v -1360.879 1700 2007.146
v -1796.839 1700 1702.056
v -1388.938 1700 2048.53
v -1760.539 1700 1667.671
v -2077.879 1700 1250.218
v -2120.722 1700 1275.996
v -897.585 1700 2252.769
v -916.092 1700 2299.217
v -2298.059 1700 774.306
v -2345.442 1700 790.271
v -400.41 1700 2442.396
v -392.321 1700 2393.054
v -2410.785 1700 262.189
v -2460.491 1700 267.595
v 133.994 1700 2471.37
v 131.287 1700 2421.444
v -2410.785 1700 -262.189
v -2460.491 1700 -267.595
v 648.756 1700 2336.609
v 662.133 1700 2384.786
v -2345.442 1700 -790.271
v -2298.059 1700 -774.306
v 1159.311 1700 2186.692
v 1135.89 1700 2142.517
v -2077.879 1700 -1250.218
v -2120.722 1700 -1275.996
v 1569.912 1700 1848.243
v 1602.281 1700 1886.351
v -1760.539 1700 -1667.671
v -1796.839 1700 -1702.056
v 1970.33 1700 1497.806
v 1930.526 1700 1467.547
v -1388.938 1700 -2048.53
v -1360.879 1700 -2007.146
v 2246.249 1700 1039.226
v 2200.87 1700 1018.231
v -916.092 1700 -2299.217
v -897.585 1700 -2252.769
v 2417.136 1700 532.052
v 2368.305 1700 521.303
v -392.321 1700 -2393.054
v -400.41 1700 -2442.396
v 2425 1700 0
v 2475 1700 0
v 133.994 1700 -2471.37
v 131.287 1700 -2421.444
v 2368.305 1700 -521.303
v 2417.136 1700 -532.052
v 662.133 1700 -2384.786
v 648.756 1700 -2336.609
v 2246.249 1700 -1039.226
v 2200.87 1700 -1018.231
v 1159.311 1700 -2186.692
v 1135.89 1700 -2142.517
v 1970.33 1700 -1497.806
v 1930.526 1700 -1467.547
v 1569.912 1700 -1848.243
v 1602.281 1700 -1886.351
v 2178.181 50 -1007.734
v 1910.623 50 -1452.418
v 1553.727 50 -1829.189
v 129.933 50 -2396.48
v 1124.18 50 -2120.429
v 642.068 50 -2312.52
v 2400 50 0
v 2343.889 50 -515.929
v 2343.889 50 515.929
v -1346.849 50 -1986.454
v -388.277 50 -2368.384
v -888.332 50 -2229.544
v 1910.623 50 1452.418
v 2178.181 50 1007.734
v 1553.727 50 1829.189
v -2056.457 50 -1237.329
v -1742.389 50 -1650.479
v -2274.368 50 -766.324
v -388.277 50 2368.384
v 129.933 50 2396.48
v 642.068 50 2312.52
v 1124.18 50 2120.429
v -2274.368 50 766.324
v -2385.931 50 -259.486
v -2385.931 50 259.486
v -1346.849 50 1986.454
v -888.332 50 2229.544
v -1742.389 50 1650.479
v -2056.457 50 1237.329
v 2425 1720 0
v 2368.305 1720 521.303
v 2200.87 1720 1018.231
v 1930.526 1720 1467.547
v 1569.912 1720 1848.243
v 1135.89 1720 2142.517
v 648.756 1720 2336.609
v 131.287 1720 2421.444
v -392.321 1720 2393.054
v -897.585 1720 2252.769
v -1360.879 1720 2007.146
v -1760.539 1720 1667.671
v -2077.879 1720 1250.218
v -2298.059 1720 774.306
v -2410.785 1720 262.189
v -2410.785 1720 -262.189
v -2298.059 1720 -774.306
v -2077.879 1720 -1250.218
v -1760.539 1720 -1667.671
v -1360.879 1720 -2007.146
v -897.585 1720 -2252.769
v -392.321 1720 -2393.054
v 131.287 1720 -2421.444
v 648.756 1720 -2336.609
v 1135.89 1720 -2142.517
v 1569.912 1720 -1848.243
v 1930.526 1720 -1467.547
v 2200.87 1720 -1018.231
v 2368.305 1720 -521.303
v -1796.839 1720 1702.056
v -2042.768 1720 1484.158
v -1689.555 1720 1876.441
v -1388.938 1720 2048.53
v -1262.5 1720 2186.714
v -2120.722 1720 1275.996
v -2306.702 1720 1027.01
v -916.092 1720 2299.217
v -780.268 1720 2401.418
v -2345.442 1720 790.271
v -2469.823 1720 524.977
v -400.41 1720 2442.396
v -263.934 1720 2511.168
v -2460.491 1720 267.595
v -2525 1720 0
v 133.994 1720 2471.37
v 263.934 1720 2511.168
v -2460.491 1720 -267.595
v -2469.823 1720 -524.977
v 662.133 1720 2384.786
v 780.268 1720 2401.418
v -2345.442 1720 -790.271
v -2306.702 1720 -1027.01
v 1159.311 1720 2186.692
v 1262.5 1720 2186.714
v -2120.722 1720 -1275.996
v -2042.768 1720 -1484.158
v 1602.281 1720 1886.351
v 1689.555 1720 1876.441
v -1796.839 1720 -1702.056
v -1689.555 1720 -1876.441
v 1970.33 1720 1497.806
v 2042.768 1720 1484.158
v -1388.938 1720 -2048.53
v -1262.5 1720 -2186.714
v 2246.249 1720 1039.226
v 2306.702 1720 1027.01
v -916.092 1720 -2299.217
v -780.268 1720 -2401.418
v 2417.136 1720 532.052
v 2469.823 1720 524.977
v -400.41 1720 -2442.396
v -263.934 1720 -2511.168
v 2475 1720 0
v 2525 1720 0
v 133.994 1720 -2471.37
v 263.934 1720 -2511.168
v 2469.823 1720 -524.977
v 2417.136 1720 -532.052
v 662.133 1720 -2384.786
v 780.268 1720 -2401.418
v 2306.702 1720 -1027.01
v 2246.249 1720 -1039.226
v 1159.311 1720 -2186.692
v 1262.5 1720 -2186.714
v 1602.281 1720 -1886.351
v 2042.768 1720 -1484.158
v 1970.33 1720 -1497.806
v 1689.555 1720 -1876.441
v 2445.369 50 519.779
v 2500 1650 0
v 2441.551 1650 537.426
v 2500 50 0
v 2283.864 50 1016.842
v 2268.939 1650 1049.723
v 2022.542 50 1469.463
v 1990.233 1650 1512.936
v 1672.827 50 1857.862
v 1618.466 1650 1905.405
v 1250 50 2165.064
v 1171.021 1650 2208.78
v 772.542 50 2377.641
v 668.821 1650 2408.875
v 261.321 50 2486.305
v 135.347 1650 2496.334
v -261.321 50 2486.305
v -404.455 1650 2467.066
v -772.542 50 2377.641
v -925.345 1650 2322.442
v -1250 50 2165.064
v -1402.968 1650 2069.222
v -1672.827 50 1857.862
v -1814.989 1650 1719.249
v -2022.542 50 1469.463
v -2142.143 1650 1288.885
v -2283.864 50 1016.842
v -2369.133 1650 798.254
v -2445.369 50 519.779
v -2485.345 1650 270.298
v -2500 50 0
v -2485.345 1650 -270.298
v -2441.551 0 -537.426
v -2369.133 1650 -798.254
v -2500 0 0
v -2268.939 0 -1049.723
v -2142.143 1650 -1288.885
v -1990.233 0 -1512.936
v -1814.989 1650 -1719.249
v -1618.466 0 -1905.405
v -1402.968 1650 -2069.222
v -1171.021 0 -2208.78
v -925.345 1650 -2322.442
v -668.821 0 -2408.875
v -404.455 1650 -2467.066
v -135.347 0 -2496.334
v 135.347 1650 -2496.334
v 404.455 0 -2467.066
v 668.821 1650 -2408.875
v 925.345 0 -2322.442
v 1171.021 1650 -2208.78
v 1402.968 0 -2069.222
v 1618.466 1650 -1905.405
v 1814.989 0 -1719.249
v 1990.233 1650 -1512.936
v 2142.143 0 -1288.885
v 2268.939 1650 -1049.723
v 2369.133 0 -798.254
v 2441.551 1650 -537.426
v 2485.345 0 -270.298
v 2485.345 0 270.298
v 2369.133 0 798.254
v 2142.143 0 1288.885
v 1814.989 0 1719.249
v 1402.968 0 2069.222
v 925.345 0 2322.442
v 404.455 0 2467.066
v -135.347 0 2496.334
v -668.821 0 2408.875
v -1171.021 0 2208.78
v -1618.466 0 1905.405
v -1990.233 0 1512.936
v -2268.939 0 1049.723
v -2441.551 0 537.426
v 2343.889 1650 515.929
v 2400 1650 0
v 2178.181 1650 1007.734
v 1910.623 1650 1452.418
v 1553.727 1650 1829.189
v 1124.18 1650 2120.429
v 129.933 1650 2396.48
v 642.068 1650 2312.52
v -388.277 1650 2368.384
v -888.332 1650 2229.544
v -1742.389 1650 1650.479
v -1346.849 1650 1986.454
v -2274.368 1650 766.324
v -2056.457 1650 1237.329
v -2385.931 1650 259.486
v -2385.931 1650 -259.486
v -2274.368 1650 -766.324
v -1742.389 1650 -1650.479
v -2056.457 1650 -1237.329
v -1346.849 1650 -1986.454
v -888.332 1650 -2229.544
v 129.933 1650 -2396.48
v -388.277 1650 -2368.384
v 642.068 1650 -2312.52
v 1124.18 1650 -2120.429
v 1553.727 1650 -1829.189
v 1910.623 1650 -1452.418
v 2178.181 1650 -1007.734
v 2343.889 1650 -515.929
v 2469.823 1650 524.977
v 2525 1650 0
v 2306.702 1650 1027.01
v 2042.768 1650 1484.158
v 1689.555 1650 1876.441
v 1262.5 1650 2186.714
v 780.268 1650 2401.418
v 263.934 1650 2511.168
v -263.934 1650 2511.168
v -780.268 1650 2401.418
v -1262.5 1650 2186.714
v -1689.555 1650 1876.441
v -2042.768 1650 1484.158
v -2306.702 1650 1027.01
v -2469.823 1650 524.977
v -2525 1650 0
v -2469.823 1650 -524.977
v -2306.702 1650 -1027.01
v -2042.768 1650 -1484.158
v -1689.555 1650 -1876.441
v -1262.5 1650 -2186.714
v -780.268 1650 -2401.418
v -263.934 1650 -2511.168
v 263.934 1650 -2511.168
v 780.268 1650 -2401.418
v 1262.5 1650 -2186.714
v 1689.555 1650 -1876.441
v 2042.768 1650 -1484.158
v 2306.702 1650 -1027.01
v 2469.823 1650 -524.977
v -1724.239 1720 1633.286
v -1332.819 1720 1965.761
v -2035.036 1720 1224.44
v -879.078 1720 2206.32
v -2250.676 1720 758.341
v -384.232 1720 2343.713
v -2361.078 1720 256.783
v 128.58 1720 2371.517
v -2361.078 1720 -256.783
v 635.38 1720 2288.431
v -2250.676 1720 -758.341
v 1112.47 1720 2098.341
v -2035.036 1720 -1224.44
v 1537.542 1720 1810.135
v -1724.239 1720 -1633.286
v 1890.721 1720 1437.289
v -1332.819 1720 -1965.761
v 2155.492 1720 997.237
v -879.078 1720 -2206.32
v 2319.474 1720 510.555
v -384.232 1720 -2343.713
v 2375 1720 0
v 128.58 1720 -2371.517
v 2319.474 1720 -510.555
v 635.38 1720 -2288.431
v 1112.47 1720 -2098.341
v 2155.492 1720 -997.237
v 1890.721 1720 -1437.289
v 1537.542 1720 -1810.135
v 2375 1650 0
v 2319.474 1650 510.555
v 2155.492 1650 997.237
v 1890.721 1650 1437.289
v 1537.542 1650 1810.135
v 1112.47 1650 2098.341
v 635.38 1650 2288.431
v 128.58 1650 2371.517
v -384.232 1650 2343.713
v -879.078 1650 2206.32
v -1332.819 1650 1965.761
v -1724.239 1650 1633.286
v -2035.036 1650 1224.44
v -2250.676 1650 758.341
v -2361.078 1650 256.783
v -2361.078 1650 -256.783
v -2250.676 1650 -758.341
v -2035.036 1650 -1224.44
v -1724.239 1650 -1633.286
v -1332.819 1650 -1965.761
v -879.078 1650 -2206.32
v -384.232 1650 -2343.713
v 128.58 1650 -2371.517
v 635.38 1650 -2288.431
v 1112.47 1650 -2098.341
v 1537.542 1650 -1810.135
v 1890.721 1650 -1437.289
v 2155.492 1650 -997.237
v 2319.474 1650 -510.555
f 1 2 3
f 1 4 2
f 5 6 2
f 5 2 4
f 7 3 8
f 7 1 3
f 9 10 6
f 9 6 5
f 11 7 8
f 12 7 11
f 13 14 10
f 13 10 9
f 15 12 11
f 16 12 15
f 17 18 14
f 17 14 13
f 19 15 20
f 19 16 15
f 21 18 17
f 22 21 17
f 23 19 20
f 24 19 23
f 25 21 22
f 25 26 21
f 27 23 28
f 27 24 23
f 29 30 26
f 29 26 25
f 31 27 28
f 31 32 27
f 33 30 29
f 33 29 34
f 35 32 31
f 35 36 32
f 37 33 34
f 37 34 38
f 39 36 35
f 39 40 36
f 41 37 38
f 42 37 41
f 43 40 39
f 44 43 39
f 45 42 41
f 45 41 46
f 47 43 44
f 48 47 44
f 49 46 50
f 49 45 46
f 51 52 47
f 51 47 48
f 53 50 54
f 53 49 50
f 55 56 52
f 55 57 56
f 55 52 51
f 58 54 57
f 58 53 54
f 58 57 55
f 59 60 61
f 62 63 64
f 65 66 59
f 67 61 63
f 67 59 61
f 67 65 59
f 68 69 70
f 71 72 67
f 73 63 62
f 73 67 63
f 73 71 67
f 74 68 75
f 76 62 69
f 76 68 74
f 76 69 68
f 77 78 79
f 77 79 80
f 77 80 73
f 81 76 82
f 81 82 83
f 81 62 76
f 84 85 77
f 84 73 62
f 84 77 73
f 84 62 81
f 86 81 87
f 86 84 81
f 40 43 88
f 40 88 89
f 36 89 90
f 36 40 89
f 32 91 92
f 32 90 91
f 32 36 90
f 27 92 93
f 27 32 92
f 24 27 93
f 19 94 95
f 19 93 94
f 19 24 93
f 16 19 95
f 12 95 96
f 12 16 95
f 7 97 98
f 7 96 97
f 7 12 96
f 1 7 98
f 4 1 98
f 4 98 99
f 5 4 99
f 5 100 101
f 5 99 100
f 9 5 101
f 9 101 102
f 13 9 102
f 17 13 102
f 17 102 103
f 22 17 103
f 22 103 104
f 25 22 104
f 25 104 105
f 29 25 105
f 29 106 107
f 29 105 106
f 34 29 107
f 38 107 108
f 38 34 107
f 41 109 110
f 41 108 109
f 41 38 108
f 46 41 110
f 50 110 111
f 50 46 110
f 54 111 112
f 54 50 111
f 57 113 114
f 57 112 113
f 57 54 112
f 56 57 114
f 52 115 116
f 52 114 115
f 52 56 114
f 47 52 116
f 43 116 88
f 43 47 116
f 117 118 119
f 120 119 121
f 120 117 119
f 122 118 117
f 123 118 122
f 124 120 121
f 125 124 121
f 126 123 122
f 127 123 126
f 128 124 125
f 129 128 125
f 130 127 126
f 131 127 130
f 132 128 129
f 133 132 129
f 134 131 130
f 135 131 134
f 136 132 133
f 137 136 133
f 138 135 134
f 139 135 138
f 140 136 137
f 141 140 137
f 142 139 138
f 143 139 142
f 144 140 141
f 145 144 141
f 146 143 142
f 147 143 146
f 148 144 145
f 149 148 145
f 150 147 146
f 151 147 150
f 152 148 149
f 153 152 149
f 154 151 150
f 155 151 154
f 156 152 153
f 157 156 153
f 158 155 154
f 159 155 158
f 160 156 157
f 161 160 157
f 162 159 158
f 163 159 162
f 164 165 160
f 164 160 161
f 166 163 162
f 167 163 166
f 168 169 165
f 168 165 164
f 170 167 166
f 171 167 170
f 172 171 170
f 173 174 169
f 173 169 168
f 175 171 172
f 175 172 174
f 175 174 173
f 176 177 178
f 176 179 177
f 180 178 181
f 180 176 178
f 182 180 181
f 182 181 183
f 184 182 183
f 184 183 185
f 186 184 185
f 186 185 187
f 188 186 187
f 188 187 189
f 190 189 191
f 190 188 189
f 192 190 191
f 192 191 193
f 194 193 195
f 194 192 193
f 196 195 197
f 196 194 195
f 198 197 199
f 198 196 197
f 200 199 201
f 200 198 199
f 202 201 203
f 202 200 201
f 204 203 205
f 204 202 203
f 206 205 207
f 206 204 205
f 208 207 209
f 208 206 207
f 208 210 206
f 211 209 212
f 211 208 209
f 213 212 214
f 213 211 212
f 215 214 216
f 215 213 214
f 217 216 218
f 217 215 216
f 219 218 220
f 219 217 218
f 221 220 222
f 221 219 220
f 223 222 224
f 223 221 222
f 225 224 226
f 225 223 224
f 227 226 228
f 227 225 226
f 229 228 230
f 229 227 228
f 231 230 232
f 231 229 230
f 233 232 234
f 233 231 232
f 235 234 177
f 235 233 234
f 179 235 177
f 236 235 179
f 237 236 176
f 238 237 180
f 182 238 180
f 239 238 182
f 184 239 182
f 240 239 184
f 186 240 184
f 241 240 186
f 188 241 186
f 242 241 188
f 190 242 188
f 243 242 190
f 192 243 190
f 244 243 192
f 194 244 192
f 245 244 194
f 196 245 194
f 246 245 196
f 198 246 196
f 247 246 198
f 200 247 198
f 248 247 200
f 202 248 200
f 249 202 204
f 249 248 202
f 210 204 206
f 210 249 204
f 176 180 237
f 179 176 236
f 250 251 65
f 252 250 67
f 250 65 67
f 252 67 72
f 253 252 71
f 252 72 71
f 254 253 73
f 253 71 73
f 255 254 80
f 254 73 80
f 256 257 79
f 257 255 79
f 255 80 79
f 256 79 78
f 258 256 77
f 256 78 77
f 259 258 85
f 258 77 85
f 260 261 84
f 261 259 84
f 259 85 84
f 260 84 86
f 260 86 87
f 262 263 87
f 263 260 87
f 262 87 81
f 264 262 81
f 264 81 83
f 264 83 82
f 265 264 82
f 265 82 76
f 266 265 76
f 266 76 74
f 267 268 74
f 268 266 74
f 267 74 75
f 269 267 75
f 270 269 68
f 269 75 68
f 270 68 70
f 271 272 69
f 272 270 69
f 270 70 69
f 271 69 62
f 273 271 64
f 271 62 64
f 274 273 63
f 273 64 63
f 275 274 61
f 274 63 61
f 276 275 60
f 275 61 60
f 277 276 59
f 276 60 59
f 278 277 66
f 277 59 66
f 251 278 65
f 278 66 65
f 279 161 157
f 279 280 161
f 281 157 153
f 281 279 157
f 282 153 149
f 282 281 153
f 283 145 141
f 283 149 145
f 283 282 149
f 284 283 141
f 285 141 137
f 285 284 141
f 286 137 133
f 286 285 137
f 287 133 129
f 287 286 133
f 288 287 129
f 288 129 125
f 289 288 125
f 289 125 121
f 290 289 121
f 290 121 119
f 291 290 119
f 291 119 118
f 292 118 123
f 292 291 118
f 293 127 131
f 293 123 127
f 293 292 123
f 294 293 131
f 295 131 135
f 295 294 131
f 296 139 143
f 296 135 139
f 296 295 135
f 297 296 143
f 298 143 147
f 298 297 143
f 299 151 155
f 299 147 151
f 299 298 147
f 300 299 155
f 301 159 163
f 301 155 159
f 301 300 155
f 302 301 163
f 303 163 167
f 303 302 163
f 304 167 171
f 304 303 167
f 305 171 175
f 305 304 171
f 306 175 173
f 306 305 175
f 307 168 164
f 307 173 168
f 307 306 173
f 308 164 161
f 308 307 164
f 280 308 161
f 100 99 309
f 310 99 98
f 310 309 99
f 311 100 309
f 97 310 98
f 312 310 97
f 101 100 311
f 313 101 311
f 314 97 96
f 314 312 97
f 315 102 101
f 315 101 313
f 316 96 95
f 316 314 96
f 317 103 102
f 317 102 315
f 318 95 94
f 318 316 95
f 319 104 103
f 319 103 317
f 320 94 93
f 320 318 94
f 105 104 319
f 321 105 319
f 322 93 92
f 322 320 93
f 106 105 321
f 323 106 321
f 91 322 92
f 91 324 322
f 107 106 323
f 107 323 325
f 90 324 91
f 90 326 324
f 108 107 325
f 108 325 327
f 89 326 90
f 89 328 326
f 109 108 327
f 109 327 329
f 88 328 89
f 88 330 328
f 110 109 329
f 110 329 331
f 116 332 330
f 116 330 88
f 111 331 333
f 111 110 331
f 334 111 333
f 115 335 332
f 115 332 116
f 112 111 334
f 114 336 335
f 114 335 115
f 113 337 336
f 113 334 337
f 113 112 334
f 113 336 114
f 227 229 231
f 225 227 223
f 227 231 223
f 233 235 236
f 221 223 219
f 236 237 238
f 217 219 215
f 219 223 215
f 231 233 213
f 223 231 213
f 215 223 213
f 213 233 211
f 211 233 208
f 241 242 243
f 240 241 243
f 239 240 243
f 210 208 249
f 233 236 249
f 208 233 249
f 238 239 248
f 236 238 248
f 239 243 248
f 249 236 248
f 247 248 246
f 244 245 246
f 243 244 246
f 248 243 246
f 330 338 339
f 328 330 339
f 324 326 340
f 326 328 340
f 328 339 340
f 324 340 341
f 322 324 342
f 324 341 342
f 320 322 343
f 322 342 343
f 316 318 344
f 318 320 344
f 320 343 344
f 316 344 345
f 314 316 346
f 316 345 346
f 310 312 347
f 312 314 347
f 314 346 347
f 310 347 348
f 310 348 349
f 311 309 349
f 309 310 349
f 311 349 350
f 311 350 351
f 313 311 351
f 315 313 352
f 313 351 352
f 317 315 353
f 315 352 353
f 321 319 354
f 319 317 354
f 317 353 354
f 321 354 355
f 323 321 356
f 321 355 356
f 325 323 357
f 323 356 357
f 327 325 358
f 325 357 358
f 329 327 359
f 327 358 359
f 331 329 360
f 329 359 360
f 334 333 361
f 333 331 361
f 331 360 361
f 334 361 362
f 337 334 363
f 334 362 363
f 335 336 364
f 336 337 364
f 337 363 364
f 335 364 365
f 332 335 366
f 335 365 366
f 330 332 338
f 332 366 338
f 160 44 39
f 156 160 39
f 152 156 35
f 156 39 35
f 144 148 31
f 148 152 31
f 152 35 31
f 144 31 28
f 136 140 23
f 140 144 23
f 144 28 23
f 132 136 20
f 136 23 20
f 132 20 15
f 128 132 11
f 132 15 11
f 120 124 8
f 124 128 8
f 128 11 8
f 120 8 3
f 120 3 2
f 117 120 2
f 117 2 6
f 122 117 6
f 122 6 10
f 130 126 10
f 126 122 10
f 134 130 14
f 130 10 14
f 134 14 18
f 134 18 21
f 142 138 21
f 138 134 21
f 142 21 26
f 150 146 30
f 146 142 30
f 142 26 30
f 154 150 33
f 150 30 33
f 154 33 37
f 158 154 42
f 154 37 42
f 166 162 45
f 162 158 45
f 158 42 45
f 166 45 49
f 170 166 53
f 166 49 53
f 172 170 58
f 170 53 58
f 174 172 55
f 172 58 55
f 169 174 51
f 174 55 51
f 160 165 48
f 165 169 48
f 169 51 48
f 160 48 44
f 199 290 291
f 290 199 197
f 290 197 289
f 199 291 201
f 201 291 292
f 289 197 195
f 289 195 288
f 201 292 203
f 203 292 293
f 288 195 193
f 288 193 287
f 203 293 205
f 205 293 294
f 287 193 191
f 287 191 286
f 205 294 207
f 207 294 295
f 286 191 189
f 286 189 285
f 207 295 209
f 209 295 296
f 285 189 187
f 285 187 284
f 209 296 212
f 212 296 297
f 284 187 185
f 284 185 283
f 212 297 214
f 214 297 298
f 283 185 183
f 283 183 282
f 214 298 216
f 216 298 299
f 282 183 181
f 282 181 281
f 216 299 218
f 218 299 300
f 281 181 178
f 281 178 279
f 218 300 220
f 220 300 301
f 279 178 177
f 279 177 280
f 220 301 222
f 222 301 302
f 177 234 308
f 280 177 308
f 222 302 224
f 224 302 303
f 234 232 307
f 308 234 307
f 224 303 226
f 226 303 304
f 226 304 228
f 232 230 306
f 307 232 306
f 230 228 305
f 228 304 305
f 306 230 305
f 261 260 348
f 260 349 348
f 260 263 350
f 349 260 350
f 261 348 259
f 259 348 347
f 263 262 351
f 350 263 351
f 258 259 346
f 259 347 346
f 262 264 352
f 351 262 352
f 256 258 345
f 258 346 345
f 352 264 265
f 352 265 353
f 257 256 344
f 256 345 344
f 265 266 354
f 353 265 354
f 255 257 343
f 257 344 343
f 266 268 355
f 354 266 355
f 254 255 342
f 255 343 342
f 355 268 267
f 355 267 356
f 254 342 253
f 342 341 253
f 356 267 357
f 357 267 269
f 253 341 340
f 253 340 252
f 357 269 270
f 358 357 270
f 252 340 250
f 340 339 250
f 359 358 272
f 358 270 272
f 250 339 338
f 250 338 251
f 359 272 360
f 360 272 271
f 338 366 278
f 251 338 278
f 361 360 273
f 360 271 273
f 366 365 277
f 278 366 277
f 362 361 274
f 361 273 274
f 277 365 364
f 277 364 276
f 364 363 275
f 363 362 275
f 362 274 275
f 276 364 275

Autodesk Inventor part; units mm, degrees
ref_plane "YZ Plane" through (0, 0, 0) normal (1, 0, 0) x (0, 1, 0)
ref_plane "XZ Plane" through (0, 0, 0) normal (0, 1, 0) x (-1, 0, 0)
ref_plane "XY Plane" through (0, 0, 0) normal (0, 0, 1) x (1, 0, 0)
sketch "Sketch1" plane through (0, 0, 0) normal (0, 1, 0) x (-1, 0, 0)
  circle A0 centre (0, 0) radius 2500
extrude "Floor" add sketch "Sketch1" along normal blind 50
sketch "Sketch2" plane through (0, 50, 0) normal (0, 1, 0) x (1, 0, 0)
  circle A0 centre (0, 0) radius 2400
  circle A1 centre (0, 0) radius 2500
extrude "Wall" add sketch "Sketch2" along normal blind 1600
sketch "Sketch3" plane through (0, 1650, 0) normal (0, 1, 0) x (1, 0, 0)
  point P0 (0, 0)
sketch "Sketch4" plane through (0, 1650, 0) normal (0, 1, 0) x (1, 0, 0)
  circle A0 centre (0, 0) radius 2525
  circle A1 centre (0, 0) radius 2375
  dimension "d4" = 5050
  dimension "d5" = 4750
extrude "Extrusion3" add sketch "Sketch4" along normal blind 50
sketch "Sketch5" plane through (0, 1700, 0) normal (0, 1, 0) x (1, 0, 0)
  circle A0 centre (0, 0) radius 2525
  circle A1 centre (0, 0) radius 2375 projected
  circle A2 centre (0, 0) radius 2375
  circle A3 centre (0, 0) radius 2425
  circle A4 centre (0, 0) radius 2475
extrude "Extrusion4" add sketch "Sketch5" along normal blind 20
properties part number "ObservatoryFloor"
